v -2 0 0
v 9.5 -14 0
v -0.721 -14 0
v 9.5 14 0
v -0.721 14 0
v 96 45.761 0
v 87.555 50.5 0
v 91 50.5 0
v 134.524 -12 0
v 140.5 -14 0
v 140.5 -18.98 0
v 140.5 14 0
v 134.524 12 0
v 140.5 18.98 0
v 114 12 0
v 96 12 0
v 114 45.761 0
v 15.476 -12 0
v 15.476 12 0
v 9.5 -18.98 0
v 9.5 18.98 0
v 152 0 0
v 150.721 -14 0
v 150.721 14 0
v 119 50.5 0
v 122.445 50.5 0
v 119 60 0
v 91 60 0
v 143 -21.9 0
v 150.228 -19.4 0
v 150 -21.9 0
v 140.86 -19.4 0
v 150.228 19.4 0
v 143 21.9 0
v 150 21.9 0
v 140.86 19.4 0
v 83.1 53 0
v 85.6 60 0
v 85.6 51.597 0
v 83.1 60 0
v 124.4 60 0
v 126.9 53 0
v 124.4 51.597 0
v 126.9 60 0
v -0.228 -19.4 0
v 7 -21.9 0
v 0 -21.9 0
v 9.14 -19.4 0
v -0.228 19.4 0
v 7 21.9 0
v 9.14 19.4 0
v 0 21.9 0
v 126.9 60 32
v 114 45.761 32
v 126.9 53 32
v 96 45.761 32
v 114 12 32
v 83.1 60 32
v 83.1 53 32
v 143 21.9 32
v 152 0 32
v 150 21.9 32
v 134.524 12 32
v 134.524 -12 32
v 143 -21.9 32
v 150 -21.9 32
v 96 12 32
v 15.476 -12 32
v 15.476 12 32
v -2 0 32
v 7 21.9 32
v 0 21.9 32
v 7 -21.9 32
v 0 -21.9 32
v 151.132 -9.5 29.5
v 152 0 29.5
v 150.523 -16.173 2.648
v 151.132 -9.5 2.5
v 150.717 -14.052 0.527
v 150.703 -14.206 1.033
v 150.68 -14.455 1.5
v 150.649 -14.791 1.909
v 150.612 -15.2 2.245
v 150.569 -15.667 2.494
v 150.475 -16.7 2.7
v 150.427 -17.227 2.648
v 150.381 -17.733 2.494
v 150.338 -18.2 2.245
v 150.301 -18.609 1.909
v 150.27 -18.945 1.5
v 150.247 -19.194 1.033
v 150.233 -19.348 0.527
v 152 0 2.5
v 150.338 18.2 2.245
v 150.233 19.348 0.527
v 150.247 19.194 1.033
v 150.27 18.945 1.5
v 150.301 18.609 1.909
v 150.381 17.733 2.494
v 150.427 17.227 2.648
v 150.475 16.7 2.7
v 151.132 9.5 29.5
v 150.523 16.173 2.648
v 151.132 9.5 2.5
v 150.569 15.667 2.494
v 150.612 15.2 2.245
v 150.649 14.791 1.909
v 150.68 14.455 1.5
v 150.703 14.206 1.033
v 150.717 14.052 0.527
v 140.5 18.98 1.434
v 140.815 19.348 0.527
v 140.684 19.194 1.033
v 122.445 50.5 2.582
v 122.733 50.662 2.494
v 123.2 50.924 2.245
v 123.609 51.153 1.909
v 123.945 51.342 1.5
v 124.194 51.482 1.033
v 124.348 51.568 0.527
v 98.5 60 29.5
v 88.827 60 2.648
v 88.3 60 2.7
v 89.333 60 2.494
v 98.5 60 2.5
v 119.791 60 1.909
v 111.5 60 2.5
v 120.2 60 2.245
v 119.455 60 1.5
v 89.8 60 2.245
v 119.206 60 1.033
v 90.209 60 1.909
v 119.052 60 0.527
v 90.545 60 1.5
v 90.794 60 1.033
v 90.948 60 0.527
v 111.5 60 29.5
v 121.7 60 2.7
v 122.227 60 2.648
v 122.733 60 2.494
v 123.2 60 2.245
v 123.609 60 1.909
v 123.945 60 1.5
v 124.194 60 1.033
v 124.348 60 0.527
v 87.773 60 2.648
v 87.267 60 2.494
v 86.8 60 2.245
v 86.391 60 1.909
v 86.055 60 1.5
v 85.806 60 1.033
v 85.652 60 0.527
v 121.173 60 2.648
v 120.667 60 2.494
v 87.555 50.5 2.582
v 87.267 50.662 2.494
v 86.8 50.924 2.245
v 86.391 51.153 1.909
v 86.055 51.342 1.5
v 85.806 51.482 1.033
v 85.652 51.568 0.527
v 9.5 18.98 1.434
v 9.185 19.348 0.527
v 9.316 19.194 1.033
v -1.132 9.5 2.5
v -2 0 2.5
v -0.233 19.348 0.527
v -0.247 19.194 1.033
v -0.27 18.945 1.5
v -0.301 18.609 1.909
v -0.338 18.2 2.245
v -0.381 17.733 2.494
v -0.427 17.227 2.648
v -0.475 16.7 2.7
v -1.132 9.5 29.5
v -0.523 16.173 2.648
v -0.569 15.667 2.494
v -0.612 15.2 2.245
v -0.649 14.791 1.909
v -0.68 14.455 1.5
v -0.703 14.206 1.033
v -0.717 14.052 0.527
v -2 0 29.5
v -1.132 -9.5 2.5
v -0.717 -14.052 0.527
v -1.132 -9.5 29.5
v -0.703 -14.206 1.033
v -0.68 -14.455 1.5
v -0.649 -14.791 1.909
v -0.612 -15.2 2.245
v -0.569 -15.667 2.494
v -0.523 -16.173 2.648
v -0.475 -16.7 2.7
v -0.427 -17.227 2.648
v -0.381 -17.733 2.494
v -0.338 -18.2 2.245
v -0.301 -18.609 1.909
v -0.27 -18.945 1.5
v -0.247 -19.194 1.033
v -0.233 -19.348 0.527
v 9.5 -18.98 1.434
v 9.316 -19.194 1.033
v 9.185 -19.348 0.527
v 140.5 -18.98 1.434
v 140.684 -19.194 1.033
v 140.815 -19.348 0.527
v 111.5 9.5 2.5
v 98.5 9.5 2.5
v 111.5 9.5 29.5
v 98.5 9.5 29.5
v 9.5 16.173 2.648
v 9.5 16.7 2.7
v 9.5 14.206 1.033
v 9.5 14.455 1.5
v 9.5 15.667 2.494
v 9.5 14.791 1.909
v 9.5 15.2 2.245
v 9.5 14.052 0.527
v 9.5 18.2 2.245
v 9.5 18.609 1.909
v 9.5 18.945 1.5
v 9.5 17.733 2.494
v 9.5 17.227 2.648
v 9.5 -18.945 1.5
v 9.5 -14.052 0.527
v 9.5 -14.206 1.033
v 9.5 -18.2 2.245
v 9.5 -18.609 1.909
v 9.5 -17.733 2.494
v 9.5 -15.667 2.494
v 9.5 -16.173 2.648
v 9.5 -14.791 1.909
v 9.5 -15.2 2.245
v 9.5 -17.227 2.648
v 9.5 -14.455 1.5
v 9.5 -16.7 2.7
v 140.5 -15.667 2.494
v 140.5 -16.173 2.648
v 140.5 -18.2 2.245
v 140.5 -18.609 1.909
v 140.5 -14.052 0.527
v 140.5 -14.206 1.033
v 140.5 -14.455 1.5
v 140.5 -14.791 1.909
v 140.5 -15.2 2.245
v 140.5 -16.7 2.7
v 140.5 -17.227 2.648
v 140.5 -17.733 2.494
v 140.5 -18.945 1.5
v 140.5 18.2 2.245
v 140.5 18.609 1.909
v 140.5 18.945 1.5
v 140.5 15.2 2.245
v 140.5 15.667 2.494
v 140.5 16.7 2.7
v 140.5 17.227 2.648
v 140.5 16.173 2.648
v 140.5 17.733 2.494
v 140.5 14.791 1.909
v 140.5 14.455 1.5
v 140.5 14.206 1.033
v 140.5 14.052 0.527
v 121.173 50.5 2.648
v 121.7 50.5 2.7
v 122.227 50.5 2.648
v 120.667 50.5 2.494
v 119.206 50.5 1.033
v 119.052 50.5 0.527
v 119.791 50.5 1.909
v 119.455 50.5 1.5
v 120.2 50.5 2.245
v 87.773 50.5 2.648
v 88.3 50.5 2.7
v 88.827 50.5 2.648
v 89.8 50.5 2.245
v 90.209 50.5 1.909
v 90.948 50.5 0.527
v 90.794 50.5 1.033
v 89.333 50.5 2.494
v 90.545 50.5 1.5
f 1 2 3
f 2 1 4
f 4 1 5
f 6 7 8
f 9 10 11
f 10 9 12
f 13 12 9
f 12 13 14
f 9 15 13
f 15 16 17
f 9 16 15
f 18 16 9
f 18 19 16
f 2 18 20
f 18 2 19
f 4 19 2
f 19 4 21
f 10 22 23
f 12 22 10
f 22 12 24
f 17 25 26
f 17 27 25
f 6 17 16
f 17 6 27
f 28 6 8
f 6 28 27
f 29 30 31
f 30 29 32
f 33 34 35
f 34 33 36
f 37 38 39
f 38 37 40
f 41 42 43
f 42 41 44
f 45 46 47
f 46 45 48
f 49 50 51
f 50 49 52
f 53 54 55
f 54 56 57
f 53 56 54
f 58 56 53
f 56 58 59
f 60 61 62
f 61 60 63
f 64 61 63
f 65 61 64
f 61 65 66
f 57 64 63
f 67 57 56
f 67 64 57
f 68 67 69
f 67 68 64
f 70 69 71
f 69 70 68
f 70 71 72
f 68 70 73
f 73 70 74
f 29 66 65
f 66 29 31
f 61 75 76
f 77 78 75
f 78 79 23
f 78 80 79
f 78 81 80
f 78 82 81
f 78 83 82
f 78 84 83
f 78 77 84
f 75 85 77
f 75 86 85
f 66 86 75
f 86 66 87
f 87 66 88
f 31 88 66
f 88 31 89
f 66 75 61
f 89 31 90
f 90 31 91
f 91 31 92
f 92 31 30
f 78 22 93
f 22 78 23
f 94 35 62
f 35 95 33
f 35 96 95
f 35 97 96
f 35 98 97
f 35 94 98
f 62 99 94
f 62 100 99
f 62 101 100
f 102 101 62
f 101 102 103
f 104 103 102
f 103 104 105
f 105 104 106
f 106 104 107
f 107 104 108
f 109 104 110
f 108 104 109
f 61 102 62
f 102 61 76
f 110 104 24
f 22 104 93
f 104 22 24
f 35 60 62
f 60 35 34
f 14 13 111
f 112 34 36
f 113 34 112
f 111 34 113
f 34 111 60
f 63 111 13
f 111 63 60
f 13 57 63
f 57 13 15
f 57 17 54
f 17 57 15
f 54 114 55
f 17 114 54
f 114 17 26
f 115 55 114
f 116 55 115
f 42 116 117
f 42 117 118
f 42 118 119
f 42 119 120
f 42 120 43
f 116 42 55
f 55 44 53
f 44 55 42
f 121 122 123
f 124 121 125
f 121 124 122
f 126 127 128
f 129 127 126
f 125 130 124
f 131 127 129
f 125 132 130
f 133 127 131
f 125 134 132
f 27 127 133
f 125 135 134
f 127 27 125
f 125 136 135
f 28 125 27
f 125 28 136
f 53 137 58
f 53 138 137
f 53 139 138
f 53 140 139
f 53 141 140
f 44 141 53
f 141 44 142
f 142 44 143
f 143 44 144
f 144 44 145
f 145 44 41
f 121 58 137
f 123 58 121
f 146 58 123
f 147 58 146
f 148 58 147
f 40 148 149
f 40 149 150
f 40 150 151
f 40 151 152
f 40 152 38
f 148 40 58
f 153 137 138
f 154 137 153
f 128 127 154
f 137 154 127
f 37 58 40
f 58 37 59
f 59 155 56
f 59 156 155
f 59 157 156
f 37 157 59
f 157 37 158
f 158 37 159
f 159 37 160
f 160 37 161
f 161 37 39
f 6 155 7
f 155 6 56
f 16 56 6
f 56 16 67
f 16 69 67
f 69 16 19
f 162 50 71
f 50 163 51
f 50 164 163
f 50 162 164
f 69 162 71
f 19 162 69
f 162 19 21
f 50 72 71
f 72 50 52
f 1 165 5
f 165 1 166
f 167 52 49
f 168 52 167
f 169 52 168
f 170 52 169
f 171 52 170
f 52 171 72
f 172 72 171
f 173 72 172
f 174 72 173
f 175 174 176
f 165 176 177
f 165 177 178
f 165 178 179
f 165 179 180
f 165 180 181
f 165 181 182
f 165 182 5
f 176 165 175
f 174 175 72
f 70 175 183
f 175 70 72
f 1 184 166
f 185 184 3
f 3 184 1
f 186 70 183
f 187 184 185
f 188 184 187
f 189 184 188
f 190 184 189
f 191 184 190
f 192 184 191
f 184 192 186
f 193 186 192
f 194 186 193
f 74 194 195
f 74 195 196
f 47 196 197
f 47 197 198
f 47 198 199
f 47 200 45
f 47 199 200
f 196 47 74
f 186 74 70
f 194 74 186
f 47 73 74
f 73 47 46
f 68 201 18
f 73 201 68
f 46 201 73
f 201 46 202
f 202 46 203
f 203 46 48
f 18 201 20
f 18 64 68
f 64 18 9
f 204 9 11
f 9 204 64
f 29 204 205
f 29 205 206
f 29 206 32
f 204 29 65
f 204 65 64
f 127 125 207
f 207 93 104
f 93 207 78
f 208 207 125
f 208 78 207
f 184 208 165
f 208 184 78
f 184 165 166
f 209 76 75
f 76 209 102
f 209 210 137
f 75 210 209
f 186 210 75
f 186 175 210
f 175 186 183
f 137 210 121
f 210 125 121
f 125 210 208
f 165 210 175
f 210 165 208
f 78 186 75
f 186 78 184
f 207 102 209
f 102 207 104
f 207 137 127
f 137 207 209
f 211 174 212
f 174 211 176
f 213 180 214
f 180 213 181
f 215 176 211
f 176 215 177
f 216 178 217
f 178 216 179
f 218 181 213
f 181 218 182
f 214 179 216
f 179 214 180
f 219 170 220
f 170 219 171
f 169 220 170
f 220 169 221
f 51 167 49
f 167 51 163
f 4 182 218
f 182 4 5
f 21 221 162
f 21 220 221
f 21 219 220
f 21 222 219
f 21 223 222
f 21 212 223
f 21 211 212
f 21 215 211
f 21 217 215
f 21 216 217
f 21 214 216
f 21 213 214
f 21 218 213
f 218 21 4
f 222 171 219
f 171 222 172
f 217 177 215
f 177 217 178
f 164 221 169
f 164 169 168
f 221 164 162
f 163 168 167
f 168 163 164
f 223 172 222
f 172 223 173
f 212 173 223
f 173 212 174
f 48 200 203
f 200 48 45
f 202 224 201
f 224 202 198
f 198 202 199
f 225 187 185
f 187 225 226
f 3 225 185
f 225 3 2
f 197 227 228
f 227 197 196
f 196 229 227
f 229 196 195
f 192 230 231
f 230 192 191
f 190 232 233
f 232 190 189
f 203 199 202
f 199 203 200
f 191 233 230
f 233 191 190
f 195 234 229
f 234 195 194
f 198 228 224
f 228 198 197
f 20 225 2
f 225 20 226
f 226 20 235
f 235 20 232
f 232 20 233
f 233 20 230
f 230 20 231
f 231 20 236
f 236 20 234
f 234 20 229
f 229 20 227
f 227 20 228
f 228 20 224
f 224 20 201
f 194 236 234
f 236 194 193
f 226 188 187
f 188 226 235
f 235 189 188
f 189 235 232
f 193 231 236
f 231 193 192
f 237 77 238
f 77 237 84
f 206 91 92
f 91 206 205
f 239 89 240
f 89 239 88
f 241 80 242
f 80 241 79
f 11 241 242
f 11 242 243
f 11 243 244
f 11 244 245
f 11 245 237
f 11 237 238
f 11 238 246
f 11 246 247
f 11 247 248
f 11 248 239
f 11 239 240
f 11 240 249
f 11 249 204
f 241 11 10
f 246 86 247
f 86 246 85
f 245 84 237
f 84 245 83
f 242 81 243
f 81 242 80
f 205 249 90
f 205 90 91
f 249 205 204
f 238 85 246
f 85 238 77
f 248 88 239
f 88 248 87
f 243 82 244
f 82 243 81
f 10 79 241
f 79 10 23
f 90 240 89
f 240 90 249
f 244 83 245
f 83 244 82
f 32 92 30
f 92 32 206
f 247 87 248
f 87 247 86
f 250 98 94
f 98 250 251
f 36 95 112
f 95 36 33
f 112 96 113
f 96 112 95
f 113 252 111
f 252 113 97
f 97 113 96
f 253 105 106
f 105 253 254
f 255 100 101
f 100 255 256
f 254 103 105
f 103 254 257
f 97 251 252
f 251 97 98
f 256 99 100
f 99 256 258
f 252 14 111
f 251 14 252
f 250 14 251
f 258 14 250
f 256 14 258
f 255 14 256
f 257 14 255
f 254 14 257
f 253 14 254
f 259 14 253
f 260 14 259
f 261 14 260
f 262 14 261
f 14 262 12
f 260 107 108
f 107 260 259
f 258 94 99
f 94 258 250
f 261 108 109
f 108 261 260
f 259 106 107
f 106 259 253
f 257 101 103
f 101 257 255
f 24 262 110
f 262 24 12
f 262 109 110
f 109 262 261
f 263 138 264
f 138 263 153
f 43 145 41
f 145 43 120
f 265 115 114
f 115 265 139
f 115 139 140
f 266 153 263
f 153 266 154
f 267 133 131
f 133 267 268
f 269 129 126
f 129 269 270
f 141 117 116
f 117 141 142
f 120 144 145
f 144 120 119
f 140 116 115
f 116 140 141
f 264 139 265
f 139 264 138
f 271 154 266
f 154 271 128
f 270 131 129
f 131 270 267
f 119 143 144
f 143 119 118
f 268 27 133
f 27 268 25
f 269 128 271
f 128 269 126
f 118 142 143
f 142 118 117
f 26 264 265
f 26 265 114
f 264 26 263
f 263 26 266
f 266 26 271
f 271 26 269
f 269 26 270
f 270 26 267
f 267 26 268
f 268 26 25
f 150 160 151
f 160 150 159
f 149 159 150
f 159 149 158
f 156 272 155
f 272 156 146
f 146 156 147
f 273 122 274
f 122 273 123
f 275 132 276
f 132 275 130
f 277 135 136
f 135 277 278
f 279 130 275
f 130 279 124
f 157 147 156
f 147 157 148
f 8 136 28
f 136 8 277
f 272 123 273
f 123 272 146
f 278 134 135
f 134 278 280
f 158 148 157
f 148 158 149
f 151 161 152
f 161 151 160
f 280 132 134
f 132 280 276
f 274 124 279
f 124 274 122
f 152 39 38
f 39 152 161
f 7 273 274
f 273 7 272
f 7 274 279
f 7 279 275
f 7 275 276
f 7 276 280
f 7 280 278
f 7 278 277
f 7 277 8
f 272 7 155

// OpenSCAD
$fn = 32;

// ----------------------------------------------------------------------
// Air duct: 24 mm duct, 2.5 mm wall, 32 mm across
// ----------------------------------------------------------------------

// --- parameters (mm) ---
duct_r = 12;              // duct core radius
duct_d = 24;              // duct core diameter
wall = 2.5;               // duct wall thickness
height = 32;              // duct width (extrusion height)
port_r = 21.9;            // port flange half width
port_d = 43.8;            // port flange width
port_t = 7;               // port flange thickness
bolt_d = 5.4;             // port bolt holes
bolt_offset = 16.7;       // bolt hole offset from the port axis
branch_r = 9;             // branch core radius
branch_d = 18;            // branch core diameter
branch_len = 60;          // branch length from the run axis

difference() {
  /* outer hull chain: tube with a flat flange plate at every port */
  linear_extrude(height = 32) {
    hull() {
      polygon([[0, -21.9], [0, 21.9], [7, 21.9], [7, -21.9]]);
      translate([10, 0]) circle(r = 12);
    }
    hull() {
      translate([10, 0]) circle(r = 12);
      translate([45, 0]) circle(r = 12);
    }
    hull() {
      translate([45, 0]) circle(r = 12);
      translate([105, 0]) circle(r = 12);
    }
    hull() {
      translate([105, 0]) circle(r = 12);
      translate([140, 0]) circle(r = 12);
    }
    hull() {
      translate([140, 0]) circle(r = 12);
      polygon([[150, 21.9], [150, -21.9], [143, -21.9], [143, 21.9]]);
    }
    hull() {
      translate([105, 0]) circle(r = 9);
      translate([105, 33]) circle(r = 9);
    }
    hull() {
      translate([105, 33]) circle(r = 9);
      translate([105, 51]) circle(r = 9);
    }
    hull() {
      translate([105, 51]) circle(r = 9);
      polygon([[83.1, 60], [126.9, 60], [126.9, 53], [83.1, 53]]);
    }
  }
  /* air passage: the same chain inset by the wall, 5 mm proud of the ports */
  translate([0, 0, 2.5]) linear_extrude(height = 27) {
    hull() {
      translate([-5, 0]) circle(r = 9.5);
      translate([45, 0]) circle(r = 9.5);
    }
    hull() {
      translate([45, 0]) circle(r = 9.5);
      translate([105, 0]) circle(r = 9.5);
    }
    hull() {
      translate([105, 0]) circle(r = 9.5);
      translate([155, 0]) circle(r = 9.5);
    }
    hull() {
      translate([105, 0]) circle(r = 6.5);
      translate([105, 33]) circle(r = 6.5);
    }
    hull() {
      translate([105, 33]) circle(r = 6.5);
      translate([105, 65]) circle(r = 6.5);
    }
  }
  translate([0, 0]) rotate([0, 0, -90]) translate([-16.7, -2.5]) rotate([-90, 0, 0]) cylinder(h = 12, d = 5.4);
  translate([0, 0]) rotate([0, 0, -90]) translate([16.7, -2.5]) rotate([-90, 0, 0]) cylinder(h = 12, d = 5.4);
  translate([150, 0]) rotate([0, 0, 90]) translate([-16.7, -2.5]) rotate([-90, 0, 0]) cylinder(h = 12, d = 5.4);
  translate([150, 0]) rotate([0, 0, 90]) translate([16.7, -2.5]) rotate([-90, 0, 0]) cylinder(h = 12, d = 5.4);
  translate([105, 60]) rotate([0, 0, 180]) translate([-16.7, -2.5]) rotate([-90, 0, 0]) cylinder(h = 12, d = 5.4);
  translate([105, 60]) rotate([0, 0, 180]) translate([16.7, -2.5]) rotate([-90, 0, 0]) cylinder(h = 12, d = 5.4);
}
